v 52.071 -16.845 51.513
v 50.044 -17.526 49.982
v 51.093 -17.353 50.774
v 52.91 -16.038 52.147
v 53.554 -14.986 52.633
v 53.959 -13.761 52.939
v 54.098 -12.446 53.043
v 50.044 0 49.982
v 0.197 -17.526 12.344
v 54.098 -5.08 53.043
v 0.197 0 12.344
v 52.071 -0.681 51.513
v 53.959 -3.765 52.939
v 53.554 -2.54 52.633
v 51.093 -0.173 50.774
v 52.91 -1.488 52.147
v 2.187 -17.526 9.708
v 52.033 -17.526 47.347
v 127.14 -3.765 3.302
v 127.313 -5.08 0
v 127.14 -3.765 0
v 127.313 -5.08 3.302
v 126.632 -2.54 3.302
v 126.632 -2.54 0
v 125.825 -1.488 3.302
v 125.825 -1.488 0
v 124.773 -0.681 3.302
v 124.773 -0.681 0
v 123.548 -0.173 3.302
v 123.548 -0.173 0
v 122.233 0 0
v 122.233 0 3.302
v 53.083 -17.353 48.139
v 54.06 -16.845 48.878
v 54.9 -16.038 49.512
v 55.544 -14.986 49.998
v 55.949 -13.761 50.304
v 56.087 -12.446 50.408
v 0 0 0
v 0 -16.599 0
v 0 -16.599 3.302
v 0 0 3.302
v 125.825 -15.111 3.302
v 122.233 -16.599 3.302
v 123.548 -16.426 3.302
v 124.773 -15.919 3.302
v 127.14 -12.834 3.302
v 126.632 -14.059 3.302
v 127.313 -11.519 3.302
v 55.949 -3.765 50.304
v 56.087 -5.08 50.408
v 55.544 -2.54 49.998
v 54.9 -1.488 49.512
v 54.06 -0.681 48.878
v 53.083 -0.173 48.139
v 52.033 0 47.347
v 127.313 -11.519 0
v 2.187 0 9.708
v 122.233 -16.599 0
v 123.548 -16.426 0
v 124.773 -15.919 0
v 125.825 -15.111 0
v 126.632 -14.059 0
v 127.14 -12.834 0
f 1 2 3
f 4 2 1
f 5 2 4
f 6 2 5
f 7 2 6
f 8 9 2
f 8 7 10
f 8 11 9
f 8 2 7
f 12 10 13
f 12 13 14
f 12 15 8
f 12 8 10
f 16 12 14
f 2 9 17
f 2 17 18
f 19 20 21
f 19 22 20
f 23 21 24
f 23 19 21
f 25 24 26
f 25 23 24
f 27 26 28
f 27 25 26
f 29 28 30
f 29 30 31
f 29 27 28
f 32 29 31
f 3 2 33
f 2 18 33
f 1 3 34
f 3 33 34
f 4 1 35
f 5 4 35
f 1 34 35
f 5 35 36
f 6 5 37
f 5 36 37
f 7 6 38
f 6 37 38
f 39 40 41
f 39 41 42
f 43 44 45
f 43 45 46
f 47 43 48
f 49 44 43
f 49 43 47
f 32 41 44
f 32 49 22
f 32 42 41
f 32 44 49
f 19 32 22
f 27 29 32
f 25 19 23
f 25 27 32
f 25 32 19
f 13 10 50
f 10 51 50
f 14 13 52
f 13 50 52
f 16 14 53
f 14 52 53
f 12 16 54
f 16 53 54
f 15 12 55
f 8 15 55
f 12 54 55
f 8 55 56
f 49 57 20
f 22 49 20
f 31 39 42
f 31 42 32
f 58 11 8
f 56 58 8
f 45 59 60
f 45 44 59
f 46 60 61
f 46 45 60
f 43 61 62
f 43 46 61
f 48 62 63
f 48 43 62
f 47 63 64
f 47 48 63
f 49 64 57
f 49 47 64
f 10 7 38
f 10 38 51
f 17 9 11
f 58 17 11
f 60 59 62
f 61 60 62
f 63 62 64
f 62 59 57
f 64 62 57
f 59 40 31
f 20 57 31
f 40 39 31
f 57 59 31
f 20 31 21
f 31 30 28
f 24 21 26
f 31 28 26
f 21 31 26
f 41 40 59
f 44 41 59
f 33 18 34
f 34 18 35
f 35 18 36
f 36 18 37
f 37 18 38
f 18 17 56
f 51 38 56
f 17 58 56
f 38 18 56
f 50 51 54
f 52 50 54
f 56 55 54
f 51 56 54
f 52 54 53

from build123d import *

# Parameters (mm, degrees)
F3_W     = 127.312735
F3_H     = 16.599134
F5_DEPTH = 3.302
F2_W     = 67.540506
F2_H     = 17.526
F6_DEPTH = 3.302
F7_R     = 5.08
F7_2_R   = 5.08


with BuildPart() as f5:
    # F3 (on Top) → F5 (new body)
    with BuildSketch(Plane.XY):
        with Locations((63.656367, -8.299567)):
            Rectangle(F3_W, F3_H)
    extrude(amount=F5_DEPTH)

    # F7#2
    f7_2_edges = [f5.edges().sort_by_distance(p)[0] for p in [
        (127.312735, 0, 1.651),
        (127.312735, -16.599134, 1.651),
    ]]
    fillet(f7_2_edges, radius=F7_2_R)


with BuildPart() as f6:
    # F2 (on face) → F6 (new body)
    with BuildSketch(Plane(origin=(-5.864446, 0, 7.766564), x_dir=(0.798046, 0, 0.602596), z_dir=(-0.602596, 0, 0.798046))):
        with Locations((41.365848, -8.763)):
            Rectangle(F2_W, F2_H)
    extrude(amount=-F6_DEPTH)

    # F7
    f7_edges = [f6.edges().sort_by_distance(p)[0] for p in [
        (55.092533, 0, 51.725704),
        (55.092533, -17.526, 51.725704),
    ]]
    fillet(f7_edges, radius=F7_R)


solid = Compound([f5.part, f6.part])
